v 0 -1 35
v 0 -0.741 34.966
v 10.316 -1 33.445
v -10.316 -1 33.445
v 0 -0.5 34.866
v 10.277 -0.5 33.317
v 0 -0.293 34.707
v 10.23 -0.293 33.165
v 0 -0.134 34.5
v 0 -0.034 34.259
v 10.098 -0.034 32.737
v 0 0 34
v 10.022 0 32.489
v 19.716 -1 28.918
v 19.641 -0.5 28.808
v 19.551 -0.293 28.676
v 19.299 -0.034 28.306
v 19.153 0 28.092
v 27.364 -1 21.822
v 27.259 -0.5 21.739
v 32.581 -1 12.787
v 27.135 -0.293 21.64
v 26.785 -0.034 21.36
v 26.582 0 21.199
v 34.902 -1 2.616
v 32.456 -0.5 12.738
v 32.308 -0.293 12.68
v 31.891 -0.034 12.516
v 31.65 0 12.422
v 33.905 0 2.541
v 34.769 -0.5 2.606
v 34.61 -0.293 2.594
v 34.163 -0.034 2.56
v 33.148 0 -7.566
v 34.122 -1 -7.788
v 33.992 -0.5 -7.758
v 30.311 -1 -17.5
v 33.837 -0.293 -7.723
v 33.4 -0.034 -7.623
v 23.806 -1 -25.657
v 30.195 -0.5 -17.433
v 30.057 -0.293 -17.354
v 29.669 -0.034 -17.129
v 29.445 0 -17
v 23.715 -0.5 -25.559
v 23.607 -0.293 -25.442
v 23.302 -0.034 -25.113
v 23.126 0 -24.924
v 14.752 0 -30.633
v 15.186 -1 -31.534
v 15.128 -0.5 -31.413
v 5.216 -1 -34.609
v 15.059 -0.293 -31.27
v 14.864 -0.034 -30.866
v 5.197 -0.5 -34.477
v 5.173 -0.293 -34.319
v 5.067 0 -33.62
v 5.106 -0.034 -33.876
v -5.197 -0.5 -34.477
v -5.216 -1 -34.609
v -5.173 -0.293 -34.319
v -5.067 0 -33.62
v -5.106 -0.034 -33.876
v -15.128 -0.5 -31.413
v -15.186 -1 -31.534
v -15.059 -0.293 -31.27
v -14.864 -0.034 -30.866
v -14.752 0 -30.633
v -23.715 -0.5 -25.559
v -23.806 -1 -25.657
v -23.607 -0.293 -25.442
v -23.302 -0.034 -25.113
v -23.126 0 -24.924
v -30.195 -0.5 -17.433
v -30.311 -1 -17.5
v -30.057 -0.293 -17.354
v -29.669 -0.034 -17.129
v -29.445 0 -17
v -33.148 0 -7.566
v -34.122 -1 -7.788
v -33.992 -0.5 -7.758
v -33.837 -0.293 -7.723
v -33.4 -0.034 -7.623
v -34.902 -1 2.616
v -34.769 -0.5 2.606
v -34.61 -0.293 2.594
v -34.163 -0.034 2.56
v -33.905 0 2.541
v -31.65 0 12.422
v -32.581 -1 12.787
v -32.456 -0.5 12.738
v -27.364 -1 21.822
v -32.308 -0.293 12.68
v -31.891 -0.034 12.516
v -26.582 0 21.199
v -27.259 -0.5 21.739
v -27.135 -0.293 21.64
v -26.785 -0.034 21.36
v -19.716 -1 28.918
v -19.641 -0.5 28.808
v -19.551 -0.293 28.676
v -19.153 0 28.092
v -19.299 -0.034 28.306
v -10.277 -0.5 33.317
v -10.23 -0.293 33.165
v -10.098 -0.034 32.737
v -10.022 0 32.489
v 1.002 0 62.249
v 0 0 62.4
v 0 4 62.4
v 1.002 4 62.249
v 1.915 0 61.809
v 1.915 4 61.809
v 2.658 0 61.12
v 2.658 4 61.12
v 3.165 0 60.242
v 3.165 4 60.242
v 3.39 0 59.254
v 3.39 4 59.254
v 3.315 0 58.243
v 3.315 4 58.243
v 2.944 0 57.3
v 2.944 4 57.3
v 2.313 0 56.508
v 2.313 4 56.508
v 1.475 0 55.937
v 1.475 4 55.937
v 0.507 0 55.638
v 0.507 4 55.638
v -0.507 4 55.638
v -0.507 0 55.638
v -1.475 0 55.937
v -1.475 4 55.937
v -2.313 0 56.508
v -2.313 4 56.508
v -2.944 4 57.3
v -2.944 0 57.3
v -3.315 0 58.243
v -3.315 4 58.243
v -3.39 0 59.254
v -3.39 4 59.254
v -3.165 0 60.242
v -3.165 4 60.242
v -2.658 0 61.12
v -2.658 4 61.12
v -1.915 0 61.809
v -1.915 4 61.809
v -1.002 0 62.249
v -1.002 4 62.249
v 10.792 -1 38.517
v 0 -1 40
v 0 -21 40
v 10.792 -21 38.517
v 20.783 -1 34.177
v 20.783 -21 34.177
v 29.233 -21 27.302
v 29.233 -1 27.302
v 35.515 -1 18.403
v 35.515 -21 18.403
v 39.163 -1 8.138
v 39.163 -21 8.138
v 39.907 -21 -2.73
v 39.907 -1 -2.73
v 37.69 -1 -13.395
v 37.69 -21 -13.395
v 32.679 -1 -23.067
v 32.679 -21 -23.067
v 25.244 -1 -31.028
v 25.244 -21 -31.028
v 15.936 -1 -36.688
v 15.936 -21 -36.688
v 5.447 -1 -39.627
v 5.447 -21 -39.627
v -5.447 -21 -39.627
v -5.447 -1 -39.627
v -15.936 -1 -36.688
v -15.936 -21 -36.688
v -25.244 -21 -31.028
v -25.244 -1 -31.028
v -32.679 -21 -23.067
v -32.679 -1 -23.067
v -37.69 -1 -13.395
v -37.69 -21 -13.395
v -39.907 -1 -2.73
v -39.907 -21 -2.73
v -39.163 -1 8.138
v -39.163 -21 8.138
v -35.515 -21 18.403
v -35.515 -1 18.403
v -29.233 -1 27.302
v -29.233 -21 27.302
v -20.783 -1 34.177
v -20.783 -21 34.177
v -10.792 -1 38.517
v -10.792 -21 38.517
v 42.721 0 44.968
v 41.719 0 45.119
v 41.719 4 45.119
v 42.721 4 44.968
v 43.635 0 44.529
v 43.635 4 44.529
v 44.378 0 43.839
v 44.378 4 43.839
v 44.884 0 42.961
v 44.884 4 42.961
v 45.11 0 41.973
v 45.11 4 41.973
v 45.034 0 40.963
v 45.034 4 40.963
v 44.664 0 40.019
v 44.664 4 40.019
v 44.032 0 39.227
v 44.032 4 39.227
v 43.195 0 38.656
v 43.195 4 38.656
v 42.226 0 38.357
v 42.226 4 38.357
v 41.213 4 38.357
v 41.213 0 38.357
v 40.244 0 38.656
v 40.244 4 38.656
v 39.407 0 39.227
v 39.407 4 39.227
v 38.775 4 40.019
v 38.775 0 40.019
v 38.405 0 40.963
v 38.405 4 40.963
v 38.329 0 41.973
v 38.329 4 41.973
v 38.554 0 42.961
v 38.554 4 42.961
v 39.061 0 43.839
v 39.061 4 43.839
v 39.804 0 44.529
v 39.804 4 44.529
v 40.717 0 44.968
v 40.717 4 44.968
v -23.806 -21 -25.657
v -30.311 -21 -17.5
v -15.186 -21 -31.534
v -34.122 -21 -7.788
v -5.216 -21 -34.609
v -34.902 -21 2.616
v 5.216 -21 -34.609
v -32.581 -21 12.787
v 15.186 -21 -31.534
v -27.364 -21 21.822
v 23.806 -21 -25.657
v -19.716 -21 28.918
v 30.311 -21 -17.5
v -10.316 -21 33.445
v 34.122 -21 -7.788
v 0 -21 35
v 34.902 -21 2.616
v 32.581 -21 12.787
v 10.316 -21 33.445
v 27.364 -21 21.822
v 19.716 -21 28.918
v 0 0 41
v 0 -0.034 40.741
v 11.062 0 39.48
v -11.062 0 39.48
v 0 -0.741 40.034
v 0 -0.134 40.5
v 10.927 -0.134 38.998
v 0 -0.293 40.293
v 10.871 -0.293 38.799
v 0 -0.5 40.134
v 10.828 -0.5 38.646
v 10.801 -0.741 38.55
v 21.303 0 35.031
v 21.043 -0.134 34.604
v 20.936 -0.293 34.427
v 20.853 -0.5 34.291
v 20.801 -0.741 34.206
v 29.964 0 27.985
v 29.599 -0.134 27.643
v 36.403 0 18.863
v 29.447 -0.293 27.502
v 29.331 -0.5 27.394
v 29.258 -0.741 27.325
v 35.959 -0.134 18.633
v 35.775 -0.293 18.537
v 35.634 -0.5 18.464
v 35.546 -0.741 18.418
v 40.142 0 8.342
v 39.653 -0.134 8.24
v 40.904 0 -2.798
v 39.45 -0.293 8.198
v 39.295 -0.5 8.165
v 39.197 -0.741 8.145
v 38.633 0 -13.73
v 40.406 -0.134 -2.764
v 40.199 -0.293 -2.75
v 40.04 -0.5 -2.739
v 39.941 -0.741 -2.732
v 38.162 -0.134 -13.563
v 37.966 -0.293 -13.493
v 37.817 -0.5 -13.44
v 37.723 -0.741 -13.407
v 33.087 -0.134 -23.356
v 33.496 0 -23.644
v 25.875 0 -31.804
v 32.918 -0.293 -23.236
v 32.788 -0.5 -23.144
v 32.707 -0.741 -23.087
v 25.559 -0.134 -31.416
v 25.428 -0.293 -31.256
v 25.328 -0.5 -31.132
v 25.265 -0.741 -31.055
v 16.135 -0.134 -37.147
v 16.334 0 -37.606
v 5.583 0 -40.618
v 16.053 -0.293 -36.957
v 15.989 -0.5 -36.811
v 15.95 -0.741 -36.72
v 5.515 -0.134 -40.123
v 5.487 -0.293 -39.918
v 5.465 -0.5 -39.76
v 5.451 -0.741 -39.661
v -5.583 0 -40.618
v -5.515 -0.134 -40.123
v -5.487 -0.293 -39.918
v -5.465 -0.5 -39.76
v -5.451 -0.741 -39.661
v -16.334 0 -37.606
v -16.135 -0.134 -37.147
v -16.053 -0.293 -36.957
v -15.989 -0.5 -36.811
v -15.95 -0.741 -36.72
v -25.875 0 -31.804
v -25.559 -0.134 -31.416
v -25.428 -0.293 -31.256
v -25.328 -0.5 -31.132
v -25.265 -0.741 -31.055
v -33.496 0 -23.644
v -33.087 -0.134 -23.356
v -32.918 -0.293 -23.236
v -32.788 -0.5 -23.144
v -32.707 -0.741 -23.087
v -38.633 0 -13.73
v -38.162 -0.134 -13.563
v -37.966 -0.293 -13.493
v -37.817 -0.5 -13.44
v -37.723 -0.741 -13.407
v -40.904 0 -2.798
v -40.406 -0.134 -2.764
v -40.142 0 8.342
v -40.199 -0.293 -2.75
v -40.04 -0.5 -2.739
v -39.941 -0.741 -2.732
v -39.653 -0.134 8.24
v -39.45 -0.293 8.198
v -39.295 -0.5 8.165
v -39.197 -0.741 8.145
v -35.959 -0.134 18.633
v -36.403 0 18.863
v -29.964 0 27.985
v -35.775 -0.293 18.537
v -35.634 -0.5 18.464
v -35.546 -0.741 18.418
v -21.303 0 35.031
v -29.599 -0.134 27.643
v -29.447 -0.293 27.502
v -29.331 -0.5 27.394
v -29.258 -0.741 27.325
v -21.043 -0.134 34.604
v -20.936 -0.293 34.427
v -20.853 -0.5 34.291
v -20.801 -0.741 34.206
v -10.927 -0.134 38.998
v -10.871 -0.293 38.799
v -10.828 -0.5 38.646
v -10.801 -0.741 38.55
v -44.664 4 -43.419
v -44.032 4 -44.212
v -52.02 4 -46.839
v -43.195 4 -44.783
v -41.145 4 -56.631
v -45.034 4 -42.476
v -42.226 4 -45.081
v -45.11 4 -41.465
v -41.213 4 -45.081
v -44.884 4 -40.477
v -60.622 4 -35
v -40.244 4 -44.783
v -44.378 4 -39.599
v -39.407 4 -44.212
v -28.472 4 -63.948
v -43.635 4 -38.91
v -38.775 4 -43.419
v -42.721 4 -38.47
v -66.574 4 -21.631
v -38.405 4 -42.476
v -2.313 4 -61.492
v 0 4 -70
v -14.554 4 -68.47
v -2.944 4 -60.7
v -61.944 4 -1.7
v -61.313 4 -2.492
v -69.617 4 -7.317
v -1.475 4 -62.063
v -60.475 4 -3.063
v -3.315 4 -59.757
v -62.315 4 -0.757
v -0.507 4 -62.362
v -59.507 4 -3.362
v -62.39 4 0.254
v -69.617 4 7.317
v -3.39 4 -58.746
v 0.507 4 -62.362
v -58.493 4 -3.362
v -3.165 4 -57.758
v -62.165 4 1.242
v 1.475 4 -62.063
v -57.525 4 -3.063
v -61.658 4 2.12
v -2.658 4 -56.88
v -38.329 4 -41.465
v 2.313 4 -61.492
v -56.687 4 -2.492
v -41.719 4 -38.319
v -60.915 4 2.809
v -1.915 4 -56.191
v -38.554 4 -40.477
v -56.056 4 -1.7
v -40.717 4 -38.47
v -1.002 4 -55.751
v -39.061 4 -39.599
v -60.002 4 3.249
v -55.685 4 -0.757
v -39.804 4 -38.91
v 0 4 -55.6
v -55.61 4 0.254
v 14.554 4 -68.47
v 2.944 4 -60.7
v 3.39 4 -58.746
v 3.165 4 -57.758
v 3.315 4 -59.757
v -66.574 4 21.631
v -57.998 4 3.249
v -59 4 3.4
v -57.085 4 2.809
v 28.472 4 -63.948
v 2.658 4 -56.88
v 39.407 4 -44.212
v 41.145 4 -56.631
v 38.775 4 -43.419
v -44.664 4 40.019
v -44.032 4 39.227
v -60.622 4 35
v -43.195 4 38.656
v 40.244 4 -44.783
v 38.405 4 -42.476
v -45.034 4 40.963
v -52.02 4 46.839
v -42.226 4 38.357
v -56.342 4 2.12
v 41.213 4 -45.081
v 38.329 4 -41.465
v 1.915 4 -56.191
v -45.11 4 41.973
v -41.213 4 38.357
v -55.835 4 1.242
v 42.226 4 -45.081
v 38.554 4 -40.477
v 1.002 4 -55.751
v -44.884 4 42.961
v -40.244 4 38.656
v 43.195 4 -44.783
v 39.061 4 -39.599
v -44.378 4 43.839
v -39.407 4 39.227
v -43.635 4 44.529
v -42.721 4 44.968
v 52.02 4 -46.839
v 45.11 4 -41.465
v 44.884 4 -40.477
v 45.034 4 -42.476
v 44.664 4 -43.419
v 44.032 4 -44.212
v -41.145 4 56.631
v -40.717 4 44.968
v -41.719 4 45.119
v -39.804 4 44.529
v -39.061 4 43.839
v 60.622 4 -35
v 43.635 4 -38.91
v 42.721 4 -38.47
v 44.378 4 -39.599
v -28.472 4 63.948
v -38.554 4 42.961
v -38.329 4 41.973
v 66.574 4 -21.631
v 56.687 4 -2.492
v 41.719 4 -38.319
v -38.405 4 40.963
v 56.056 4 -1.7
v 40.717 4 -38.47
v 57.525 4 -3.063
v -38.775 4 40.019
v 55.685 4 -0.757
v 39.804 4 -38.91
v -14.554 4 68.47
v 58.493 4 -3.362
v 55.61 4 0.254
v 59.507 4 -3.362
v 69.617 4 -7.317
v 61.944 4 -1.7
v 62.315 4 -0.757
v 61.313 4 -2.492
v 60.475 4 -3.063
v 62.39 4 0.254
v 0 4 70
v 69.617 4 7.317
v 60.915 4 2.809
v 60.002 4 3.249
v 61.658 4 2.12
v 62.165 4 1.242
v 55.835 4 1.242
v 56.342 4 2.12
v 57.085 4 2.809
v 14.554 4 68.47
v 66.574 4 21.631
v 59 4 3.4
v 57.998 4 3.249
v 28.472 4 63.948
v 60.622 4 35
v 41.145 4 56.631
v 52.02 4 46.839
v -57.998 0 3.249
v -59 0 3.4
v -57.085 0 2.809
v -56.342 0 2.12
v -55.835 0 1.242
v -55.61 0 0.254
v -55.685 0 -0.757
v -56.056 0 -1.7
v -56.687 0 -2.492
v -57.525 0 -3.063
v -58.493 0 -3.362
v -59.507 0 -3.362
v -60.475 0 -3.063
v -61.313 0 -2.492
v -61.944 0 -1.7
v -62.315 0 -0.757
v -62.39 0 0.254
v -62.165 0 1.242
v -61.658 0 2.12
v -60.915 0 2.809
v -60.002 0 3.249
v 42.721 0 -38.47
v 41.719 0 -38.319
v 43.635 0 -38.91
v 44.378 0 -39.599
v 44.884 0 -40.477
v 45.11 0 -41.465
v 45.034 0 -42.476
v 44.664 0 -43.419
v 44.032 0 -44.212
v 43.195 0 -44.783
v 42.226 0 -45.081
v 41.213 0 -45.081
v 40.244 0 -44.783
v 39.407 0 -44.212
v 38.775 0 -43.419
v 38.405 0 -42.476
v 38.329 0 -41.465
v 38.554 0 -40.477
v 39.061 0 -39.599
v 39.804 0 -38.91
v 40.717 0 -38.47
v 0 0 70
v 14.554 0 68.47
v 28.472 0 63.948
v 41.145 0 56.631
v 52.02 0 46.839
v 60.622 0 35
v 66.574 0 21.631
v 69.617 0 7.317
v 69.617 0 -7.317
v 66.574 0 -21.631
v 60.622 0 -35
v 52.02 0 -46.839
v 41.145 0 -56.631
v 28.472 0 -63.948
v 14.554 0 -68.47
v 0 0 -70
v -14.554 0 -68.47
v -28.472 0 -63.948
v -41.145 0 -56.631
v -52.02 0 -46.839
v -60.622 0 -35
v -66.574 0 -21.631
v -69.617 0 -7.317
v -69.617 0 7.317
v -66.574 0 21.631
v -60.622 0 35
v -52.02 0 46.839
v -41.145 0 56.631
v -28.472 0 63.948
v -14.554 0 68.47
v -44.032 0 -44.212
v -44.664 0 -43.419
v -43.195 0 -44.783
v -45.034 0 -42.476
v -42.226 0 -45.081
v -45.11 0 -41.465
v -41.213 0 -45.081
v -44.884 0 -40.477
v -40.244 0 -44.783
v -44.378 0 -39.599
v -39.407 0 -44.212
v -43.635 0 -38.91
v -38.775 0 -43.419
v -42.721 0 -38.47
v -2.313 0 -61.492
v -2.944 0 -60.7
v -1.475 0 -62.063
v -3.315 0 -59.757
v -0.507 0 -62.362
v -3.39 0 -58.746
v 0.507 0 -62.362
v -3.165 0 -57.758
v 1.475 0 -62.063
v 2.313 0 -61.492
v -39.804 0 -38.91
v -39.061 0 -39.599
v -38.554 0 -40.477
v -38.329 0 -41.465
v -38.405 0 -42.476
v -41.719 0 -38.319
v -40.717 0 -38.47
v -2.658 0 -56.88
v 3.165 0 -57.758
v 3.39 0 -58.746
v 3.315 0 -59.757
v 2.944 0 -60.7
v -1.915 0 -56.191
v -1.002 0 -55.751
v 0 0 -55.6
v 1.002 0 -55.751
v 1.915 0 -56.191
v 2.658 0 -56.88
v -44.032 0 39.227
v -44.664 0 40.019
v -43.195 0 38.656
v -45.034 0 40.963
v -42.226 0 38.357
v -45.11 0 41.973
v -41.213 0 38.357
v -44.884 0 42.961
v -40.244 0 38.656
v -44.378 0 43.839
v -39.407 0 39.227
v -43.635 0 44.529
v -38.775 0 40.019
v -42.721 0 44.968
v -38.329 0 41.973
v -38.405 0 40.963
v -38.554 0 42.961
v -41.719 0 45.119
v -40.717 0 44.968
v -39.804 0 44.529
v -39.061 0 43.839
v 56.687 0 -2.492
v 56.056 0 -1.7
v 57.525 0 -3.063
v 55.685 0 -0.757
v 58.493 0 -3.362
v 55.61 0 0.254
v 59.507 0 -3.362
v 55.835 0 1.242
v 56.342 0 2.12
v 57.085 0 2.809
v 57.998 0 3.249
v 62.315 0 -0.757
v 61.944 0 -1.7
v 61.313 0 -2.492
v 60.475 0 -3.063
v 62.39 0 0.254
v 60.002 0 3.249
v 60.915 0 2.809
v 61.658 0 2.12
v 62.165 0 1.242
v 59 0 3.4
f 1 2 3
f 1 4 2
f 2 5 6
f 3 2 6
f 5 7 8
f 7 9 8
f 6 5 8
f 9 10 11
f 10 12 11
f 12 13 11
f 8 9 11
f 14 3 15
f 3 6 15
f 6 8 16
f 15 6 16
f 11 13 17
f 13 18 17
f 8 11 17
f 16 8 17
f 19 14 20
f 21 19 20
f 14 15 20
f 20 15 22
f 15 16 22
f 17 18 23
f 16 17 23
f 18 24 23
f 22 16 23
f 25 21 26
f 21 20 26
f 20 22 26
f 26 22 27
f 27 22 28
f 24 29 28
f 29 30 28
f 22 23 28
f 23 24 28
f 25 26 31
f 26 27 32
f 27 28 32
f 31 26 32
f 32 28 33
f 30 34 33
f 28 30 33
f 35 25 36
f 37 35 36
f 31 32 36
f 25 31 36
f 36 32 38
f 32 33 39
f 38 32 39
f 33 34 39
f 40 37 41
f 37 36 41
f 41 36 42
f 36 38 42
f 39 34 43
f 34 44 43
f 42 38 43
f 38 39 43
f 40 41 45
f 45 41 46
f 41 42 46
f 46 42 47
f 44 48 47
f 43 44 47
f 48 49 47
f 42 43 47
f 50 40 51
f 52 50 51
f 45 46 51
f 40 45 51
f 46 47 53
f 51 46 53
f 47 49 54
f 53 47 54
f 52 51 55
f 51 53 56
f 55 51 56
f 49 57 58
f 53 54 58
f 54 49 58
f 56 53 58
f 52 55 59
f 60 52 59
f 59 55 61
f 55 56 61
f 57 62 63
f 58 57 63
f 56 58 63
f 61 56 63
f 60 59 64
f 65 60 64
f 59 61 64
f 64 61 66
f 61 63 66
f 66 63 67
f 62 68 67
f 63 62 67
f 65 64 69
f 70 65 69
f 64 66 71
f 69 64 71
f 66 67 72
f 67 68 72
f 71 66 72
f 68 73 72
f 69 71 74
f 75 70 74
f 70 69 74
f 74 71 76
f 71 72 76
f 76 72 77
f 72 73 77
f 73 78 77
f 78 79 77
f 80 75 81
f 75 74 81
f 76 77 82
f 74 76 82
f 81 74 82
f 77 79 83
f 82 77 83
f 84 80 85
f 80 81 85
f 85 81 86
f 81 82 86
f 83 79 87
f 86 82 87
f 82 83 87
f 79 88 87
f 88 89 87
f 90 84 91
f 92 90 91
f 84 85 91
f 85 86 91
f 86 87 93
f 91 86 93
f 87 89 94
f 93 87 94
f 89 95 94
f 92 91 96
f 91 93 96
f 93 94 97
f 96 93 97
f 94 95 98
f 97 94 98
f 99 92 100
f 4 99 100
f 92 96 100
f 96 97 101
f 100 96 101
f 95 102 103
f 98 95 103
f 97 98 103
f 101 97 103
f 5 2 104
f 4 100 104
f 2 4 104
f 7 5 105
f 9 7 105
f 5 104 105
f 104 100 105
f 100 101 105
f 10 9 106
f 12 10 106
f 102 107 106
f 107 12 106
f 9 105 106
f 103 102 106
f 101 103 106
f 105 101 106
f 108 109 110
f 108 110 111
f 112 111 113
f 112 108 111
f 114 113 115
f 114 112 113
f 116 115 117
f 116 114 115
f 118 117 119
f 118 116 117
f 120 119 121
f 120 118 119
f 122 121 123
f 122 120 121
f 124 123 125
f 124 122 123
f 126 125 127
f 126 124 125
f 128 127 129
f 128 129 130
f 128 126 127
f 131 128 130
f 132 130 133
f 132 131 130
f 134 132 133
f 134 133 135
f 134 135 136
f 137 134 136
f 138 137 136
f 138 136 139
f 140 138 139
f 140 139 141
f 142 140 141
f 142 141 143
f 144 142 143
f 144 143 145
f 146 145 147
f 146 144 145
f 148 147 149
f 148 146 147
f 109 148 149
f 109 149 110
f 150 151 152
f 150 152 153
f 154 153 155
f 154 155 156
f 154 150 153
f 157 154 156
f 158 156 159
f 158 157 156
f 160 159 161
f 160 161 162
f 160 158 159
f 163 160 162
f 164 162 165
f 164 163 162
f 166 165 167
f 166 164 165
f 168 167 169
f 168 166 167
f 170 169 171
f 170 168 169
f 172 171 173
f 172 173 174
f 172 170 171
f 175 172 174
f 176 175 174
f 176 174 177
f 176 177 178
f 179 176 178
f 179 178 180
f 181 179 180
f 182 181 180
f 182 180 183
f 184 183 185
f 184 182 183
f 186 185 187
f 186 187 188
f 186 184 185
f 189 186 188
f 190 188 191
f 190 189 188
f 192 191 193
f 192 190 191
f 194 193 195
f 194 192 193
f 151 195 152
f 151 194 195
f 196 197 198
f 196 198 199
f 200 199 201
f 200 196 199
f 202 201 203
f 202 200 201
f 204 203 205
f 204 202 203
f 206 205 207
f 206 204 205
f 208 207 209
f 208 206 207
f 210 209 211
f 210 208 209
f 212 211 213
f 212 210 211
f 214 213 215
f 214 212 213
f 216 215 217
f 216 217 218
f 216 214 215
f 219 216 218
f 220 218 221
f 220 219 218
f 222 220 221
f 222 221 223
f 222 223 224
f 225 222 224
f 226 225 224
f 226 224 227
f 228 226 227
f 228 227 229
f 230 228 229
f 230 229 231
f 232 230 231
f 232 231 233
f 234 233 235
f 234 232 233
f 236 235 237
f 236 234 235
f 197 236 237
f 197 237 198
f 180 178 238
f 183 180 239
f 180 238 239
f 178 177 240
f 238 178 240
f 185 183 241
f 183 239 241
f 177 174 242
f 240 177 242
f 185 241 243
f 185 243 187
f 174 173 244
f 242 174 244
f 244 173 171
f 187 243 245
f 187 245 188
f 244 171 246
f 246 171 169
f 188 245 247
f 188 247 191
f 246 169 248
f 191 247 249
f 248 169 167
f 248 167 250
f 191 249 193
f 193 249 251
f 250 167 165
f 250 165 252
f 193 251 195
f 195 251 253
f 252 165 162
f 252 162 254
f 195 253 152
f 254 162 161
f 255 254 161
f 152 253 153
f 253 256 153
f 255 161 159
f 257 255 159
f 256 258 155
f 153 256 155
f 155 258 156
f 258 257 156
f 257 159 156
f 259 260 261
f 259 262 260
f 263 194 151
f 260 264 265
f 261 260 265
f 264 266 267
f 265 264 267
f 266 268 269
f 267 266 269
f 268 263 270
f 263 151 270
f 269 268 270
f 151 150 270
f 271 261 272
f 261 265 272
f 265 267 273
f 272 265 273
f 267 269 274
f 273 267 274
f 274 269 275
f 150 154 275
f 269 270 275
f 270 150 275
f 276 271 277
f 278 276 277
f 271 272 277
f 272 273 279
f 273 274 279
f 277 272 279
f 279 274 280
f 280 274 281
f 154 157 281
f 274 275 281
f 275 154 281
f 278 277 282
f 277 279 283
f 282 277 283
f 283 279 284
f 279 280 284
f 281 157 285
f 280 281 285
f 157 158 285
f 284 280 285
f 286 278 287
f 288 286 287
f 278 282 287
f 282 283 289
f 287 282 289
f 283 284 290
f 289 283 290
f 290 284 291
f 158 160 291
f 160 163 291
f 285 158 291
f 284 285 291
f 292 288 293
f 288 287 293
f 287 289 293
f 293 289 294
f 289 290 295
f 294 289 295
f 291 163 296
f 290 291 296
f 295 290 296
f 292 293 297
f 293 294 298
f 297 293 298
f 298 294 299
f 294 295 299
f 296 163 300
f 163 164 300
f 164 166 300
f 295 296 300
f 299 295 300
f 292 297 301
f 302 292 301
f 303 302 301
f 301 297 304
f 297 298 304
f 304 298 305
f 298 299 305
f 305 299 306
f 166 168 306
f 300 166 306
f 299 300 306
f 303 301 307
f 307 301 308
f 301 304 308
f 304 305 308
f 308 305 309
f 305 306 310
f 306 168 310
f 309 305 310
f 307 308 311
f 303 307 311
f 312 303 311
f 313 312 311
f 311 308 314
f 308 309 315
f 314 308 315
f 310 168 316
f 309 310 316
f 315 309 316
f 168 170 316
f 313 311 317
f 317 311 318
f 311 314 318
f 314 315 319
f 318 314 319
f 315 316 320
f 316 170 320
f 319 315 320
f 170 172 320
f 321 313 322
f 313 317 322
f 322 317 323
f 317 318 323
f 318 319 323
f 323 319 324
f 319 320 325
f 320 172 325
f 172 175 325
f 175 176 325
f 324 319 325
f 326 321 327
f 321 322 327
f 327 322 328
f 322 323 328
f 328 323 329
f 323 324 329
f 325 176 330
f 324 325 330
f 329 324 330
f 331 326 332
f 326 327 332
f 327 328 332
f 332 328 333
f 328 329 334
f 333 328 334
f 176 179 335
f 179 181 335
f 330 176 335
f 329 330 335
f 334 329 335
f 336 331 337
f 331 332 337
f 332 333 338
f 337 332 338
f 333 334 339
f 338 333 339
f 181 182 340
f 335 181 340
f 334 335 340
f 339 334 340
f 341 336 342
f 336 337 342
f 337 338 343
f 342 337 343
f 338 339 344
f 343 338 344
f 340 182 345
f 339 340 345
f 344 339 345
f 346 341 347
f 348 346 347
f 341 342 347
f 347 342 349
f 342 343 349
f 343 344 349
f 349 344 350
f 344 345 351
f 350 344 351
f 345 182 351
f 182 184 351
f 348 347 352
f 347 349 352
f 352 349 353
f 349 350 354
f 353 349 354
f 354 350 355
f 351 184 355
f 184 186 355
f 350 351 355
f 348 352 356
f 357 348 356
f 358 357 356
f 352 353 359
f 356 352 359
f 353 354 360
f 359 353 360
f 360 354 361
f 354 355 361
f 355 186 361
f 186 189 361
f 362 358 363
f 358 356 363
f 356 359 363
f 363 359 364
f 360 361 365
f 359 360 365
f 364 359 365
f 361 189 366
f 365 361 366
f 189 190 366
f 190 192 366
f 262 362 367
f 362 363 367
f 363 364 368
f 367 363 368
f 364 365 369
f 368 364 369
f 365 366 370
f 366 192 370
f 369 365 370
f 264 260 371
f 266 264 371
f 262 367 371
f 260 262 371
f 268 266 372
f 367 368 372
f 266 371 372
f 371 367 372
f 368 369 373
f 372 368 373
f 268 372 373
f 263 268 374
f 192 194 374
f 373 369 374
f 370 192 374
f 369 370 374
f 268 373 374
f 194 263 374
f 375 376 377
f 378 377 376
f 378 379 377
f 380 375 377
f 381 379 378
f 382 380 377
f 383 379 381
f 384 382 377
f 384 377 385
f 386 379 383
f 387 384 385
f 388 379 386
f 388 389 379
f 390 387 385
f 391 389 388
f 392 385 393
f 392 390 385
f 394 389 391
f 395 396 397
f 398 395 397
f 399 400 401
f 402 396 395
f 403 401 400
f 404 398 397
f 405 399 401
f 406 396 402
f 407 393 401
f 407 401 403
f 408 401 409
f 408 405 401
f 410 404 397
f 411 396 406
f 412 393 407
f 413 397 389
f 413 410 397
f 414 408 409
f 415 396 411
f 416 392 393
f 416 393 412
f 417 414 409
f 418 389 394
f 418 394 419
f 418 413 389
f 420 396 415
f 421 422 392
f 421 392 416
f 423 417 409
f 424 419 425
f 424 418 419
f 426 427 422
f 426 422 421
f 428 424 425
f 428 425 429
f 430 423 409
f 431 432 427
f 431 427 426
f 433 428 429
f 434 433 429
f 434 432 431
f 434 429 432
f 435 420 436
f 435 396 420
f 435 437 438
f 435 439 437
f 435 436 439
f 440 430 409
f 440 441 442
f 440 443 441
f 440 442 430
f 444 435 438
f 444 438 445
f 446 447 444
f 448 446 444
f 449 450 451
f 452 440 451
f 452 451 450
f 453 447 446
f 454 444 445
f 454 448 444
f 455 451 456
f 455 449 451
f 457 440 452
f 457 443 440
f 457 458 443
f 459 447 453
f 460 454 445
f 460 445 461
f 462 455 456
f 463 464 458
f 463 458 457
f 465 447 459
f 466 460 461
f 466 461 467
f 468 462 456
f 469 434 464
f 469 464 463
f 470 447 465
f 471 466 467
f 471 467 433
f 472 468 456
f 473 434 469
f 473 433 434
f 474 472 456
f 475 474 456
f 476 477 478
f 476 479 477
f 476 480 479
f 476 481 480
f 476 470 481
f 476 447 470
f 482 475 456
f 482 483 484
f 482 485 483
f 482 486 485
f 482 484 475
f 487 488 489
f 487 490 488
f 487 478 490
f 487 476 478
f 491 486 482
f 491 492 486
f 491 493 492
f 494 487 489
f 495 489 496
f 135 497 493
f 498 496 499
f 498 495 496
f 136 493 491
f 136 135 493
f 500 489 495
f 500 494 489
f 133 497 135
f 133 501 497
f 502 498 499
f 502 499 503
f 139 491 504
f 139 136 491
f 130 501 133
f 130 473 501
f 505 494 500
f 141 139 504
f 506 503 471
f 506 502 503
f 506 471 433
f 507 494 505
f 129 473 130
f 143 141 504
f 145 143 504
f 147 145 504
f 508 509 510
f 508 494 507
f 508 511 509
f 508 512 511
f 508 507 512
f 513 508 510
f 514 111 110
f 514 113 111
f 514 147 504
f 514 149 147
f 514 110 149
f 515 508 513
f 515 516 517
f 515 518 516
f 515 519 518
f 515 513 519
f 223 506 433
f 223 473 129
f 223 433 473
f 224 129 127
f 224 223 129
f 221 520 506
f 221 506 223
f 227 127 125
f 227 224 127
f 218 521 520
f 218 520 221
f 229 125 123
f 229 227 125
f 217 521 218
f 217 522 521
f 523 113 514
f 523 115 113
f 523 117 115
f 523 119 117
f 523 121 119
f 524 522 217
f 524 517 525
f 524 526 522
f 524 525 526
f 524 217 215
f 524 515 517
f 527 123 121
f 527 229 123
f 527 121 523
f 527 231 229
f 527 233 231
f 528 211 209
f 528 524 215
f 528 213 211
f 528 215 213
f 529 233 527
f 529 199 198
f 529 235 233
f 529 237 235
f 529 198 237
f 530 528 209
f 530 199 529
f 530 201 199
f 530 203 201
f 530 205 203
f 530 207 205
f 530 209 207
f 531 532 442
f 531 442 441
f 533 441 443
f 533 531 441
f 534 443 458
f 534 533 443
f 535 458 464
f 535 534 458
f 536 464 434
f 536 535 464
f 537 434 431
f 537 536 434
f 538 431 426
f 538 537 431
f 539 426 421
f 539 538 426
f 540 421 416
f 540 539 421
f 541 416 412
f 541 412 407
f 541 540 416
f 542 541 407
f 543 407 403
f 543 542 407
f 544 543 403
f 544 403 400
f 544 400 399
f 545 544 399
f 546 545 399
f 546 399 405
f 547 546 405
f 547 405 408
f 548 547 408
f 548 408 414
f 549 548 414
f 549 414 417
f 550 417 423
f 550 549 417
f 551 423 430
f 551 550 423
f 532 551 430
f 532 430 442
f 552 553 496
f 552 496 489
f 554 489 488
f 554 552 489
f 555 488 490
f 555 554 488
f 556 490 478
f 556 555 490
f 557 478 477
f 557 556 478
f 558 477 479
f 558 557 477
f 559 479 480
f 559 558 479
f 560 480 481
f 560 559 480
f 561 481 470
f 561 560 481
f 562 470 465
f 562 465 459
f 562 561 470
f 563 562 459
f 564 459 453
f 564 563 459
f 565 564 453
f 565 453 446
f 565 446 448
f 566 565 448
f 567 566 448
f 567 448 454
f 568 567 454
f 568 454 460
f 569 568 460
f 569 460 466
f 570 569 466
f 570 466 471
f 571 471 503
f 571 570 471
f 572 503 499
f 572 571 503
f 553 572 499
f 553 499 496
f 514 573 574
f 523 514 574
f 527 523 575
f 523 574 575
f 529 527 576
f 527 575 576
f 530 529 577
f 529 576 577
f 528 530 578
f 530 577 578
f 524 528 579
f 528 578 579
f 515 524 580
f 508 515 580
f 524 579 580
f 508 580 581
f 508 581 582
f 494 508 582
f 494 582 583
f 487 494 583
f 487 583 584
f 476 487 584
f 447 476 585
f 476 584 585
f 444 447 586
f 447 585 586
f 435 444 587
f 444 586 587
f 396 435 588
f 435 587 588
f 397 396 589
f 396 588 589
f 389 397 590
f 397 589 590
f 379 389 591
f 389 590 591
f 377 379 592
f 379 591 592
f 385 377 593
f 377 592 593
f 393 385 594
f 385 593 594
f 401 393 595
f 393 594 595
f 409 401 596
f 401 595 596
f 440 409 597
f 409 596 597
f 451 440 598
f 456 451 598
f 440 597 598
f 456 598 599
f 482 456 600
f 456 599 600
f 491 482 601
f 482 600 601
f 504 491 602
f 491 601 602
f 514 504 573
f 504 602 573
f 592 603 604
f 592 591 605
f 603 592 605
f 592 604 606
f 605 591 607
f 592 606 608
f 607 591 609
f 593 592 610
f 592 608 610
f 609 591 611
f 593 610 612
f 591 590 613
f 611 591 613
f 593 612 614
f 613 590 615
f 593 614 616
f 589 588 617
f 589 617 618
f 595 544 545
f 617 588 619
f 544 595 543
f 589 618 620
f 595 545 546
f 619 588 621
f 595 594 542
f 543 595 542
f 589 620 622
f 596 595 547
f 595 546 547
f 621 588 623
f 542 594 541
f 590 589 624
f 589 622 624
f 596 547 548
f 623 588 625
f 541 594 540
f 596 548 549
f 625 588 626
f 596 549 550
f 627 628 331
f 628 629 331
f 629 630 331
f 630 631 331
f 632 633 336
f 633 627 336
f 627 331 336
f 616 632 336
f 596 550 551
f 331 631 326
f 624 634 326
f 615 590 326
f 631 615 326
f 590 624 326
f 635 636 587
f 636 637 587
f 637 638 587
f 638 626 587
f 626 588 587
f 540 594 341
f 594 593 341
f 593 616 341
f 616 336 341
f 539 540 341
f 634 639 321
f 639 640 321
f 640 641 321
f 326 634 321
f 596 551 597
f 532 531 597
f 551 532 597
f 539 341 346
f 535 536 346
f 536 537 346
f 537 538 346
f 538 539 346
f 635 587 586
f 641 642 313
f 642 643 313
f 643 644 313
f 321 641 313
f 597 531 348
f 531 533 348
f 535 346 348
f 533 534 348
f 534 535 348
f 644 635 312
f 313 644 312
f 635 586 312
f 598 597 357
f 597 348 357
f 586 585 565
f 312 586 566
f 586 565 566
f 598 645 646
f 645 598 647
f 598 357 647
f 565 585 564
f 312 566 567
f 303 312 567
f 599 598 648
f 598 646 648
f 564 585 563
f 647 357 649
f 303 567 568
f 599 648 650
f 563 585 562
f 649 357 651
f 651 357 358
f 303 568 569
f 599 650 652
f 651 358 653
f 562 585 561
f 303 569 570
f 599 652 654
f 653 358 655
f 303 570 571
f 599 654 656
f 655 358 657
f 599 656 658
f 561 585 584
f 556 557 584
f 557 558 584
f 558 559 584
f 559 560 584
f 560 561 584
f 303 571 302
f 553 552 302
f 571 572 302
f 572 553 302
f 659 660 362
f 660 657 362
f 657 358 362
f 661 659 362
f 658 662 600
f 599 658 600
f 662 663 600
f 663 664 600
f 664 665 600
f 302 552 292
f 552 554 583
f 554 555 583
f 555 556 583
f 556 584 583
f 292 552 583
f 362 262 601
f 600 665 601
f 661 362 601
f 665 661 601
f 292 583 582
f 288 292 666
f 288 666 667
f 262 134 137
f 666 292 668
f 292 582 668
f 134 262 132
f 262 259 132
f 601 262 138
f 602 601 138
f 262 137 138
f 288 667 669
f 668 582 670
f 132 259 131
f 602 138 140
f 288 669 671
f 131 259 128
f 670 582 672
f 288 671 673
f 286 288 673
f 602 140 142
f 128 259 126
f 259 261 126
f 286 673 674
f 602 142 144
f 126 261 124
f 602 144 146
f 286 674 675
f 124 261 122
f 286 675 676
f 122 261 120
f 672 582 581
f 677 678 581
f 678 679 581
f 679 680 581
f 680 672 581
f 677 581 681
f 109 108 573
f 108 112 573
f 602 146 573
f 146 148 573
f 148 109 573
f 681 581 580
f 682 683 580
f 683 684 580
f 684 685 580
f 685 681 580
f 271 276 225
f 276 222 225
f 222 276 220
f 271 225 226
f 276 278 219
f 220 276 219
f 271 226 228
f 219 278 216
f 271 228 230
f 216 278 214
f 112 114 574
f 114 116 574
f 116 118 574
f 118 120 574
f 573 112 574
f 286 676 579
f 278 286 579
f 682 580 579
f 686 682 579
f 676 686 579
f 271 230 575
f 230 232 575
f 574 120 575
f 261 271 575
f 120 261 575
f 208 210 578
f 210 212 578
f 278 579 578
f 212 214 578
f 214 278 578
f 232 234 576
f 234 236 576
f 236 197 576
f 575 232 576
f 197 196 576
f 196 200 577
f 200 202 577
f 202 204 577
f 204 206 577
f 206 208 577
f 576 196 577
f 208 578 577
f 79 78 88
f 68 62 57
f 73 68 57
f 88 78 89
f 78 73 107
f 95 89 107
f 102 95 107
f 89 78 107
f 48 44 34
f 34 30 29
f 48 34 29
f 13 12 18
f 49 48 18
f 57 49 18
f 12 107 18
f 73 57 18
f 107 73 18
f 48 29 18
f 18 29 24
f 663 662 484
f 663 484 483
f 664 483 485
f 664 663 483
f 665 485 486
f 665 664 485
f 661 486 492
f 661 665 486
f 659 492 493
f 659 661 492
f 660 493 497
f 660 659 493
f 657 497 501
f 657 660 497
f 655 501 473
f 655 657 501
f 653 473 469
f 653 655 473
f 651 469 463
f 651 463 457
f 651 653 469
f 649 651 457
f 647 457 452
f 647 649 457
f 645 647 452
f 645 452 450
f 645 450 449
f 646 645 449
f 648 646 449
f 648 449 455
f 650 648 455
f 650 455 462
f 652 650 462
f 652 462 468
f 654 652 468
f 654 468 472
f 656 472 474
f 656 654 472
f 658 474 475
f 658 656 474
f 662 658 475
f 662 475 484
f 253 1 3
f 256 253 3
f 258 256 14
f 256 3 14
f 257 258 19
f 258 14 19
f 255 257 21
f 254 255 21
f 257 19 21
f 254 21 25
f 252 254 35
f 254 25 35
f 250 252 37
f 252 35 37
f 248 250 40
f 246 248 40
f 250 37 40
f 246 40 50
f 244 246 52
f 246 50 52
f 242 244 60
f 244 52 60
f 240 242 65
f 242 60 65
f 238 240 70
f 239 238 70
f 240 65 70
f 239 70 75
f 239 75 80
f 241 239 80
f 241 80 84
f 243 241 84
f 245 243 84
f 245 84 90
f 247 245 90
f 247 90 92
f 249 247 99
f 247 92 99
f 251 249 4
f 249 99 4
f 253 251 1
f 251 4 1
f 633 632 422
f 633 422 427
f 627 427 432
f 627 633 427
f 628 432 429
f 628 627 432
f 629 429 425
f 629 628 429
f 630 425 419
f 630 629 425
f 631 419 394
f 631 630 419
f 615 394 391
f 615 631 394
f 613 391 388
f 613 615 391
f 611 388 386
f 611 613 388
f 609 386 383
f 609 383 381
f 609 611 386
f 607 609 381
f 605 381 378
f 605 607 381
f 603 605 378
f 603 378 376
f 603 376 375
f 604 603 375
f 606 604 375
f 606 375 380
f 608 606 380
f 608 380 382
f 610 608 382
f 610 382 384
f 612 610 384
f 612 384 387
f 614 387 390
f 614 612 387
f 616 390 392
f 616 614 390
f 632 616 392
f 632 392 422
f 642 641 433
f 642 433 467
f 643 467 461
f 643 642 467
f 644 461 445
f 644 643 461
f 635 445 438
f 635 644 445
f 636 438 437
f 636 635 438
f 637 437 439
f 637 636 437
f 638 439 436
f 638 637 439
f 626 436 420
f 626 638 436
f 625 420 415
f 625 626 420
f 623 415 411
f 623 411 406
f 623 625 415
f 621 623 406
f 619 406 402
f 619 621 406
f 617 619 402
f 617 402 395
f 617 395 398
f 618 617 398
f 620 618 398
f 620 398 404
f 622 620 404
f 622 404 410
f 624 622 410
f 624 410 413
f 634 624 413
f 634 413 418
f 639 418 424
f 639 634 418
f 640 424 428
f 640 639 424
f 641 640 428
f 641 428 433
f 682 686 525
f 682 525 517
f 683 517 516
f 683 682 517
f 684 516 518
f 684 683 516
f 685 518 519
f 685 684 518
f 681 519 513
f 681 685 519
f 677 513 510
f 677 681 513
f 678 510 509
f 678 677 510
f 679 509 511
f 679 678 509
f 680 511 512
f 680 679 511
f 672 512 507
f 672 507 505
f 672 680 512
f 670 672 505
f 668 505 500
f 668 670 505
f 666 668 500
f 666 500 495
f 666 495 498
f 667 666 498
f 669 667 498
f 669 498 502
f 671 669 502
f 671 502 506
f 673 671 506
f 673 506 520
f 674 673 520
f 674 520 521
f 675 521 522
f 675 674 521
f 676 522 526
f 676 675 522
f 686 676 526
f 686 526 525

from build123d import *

# Parameters (mm, degrees)
SKETCH_1_R      = 70
SKETCH_1_R_2    = 3.4
EXTRUDE_1_DEPTH = 4
SKETCH_2_R      = 40
SKETCH_2_R_2    = 35
EXTRUDE_2_DEPTH = 21
FILLET_2_R      = 1


with BuildPart() as part:
    # Эскиз1 → Бобышка-Вытянуть1 (new body)
    with BuildSketch(Plane(origin=(0, 0, 0), x_dir=(1, 0, 0), z_dir=(0, 1, 0))):
        with Locations(Location((0, 0, 0), (0, 0, 270))):
            Circle(SKETCH_1_R)
        with Locations(Location((59, 0, 0), (0, 0, 270))):
            Circle(SKETCH_1_R_2, mode=Mode.SUBTRACT)
        with Locations(Location((41.71930009, -41.71930009, 0), (0, 0, 270))):
            Circle(SKETCH_1_R_2, mode=Mode.SUBTRACT)
        with Locations(Location((0, -59, 0), (0, 0, 270))):
            Circle(SKETCH_1_R_2, mode=Mode.SUBTRACT)
        with Locations(Location((-41.71930009, -41.71930009, 0), (0, 0, 270))):
            Circle(SKETCH_1_R_2, mode=Mode.SUBTRACT)
        with Locations(Location((-59, 0, 0), (0, 0, 270))):
            Circle(SKETCH_1_R_2, mode=Mode.SUBTRACT)
        with Locations(Location((-41.71930009, 41.71930009, 0), (0, 0, 270))):
            Circle(SKETCH_1_R_2, mode=Mode.SUBTRACT)
        with Locations(Location((0, 59, 0), (0, 0, 270))):
            Circle(SKETCH_1_R_2, mode=Mode.SUBTRACT)
        with Locations(Location((41.71930009, 41.71930009, 0), (0, 0, 270))):
            Circle(SKETCH_1_R_2, mode=Mode.SUBTRACT)
    extrude(amount=EXTRUDE_1_DEPTH)

    # Эскиз2 → Бобышка-Вытянуть2 (add)
    with BuildSketch(Plane(origin=(0, 0, 0), x_dir=(1, 0, 0), z_dir=(0, 1, 0))):
        with Locations(Location((0, 0, 0), (0, 0, 270))):
            Circle(SKETCH_2_R)
        with Locations(Location((0, 0, 0), (0, 0, 270))):
            Circle(SKETCH_2_R_2, mode=Mode.SUBTRACT)
    extrude(amount=-EXTRUDE_2_DEPTH)

    # Скругление2
    fillet_2_edges = [part.edges().sort_by_distance(p)[0] for p in [
        (0, 0, -35),
        (0, 0, -40),
    ]]
    fillet(fillet_2_edges, radius=FILLET_2_R)


solid = part.part
